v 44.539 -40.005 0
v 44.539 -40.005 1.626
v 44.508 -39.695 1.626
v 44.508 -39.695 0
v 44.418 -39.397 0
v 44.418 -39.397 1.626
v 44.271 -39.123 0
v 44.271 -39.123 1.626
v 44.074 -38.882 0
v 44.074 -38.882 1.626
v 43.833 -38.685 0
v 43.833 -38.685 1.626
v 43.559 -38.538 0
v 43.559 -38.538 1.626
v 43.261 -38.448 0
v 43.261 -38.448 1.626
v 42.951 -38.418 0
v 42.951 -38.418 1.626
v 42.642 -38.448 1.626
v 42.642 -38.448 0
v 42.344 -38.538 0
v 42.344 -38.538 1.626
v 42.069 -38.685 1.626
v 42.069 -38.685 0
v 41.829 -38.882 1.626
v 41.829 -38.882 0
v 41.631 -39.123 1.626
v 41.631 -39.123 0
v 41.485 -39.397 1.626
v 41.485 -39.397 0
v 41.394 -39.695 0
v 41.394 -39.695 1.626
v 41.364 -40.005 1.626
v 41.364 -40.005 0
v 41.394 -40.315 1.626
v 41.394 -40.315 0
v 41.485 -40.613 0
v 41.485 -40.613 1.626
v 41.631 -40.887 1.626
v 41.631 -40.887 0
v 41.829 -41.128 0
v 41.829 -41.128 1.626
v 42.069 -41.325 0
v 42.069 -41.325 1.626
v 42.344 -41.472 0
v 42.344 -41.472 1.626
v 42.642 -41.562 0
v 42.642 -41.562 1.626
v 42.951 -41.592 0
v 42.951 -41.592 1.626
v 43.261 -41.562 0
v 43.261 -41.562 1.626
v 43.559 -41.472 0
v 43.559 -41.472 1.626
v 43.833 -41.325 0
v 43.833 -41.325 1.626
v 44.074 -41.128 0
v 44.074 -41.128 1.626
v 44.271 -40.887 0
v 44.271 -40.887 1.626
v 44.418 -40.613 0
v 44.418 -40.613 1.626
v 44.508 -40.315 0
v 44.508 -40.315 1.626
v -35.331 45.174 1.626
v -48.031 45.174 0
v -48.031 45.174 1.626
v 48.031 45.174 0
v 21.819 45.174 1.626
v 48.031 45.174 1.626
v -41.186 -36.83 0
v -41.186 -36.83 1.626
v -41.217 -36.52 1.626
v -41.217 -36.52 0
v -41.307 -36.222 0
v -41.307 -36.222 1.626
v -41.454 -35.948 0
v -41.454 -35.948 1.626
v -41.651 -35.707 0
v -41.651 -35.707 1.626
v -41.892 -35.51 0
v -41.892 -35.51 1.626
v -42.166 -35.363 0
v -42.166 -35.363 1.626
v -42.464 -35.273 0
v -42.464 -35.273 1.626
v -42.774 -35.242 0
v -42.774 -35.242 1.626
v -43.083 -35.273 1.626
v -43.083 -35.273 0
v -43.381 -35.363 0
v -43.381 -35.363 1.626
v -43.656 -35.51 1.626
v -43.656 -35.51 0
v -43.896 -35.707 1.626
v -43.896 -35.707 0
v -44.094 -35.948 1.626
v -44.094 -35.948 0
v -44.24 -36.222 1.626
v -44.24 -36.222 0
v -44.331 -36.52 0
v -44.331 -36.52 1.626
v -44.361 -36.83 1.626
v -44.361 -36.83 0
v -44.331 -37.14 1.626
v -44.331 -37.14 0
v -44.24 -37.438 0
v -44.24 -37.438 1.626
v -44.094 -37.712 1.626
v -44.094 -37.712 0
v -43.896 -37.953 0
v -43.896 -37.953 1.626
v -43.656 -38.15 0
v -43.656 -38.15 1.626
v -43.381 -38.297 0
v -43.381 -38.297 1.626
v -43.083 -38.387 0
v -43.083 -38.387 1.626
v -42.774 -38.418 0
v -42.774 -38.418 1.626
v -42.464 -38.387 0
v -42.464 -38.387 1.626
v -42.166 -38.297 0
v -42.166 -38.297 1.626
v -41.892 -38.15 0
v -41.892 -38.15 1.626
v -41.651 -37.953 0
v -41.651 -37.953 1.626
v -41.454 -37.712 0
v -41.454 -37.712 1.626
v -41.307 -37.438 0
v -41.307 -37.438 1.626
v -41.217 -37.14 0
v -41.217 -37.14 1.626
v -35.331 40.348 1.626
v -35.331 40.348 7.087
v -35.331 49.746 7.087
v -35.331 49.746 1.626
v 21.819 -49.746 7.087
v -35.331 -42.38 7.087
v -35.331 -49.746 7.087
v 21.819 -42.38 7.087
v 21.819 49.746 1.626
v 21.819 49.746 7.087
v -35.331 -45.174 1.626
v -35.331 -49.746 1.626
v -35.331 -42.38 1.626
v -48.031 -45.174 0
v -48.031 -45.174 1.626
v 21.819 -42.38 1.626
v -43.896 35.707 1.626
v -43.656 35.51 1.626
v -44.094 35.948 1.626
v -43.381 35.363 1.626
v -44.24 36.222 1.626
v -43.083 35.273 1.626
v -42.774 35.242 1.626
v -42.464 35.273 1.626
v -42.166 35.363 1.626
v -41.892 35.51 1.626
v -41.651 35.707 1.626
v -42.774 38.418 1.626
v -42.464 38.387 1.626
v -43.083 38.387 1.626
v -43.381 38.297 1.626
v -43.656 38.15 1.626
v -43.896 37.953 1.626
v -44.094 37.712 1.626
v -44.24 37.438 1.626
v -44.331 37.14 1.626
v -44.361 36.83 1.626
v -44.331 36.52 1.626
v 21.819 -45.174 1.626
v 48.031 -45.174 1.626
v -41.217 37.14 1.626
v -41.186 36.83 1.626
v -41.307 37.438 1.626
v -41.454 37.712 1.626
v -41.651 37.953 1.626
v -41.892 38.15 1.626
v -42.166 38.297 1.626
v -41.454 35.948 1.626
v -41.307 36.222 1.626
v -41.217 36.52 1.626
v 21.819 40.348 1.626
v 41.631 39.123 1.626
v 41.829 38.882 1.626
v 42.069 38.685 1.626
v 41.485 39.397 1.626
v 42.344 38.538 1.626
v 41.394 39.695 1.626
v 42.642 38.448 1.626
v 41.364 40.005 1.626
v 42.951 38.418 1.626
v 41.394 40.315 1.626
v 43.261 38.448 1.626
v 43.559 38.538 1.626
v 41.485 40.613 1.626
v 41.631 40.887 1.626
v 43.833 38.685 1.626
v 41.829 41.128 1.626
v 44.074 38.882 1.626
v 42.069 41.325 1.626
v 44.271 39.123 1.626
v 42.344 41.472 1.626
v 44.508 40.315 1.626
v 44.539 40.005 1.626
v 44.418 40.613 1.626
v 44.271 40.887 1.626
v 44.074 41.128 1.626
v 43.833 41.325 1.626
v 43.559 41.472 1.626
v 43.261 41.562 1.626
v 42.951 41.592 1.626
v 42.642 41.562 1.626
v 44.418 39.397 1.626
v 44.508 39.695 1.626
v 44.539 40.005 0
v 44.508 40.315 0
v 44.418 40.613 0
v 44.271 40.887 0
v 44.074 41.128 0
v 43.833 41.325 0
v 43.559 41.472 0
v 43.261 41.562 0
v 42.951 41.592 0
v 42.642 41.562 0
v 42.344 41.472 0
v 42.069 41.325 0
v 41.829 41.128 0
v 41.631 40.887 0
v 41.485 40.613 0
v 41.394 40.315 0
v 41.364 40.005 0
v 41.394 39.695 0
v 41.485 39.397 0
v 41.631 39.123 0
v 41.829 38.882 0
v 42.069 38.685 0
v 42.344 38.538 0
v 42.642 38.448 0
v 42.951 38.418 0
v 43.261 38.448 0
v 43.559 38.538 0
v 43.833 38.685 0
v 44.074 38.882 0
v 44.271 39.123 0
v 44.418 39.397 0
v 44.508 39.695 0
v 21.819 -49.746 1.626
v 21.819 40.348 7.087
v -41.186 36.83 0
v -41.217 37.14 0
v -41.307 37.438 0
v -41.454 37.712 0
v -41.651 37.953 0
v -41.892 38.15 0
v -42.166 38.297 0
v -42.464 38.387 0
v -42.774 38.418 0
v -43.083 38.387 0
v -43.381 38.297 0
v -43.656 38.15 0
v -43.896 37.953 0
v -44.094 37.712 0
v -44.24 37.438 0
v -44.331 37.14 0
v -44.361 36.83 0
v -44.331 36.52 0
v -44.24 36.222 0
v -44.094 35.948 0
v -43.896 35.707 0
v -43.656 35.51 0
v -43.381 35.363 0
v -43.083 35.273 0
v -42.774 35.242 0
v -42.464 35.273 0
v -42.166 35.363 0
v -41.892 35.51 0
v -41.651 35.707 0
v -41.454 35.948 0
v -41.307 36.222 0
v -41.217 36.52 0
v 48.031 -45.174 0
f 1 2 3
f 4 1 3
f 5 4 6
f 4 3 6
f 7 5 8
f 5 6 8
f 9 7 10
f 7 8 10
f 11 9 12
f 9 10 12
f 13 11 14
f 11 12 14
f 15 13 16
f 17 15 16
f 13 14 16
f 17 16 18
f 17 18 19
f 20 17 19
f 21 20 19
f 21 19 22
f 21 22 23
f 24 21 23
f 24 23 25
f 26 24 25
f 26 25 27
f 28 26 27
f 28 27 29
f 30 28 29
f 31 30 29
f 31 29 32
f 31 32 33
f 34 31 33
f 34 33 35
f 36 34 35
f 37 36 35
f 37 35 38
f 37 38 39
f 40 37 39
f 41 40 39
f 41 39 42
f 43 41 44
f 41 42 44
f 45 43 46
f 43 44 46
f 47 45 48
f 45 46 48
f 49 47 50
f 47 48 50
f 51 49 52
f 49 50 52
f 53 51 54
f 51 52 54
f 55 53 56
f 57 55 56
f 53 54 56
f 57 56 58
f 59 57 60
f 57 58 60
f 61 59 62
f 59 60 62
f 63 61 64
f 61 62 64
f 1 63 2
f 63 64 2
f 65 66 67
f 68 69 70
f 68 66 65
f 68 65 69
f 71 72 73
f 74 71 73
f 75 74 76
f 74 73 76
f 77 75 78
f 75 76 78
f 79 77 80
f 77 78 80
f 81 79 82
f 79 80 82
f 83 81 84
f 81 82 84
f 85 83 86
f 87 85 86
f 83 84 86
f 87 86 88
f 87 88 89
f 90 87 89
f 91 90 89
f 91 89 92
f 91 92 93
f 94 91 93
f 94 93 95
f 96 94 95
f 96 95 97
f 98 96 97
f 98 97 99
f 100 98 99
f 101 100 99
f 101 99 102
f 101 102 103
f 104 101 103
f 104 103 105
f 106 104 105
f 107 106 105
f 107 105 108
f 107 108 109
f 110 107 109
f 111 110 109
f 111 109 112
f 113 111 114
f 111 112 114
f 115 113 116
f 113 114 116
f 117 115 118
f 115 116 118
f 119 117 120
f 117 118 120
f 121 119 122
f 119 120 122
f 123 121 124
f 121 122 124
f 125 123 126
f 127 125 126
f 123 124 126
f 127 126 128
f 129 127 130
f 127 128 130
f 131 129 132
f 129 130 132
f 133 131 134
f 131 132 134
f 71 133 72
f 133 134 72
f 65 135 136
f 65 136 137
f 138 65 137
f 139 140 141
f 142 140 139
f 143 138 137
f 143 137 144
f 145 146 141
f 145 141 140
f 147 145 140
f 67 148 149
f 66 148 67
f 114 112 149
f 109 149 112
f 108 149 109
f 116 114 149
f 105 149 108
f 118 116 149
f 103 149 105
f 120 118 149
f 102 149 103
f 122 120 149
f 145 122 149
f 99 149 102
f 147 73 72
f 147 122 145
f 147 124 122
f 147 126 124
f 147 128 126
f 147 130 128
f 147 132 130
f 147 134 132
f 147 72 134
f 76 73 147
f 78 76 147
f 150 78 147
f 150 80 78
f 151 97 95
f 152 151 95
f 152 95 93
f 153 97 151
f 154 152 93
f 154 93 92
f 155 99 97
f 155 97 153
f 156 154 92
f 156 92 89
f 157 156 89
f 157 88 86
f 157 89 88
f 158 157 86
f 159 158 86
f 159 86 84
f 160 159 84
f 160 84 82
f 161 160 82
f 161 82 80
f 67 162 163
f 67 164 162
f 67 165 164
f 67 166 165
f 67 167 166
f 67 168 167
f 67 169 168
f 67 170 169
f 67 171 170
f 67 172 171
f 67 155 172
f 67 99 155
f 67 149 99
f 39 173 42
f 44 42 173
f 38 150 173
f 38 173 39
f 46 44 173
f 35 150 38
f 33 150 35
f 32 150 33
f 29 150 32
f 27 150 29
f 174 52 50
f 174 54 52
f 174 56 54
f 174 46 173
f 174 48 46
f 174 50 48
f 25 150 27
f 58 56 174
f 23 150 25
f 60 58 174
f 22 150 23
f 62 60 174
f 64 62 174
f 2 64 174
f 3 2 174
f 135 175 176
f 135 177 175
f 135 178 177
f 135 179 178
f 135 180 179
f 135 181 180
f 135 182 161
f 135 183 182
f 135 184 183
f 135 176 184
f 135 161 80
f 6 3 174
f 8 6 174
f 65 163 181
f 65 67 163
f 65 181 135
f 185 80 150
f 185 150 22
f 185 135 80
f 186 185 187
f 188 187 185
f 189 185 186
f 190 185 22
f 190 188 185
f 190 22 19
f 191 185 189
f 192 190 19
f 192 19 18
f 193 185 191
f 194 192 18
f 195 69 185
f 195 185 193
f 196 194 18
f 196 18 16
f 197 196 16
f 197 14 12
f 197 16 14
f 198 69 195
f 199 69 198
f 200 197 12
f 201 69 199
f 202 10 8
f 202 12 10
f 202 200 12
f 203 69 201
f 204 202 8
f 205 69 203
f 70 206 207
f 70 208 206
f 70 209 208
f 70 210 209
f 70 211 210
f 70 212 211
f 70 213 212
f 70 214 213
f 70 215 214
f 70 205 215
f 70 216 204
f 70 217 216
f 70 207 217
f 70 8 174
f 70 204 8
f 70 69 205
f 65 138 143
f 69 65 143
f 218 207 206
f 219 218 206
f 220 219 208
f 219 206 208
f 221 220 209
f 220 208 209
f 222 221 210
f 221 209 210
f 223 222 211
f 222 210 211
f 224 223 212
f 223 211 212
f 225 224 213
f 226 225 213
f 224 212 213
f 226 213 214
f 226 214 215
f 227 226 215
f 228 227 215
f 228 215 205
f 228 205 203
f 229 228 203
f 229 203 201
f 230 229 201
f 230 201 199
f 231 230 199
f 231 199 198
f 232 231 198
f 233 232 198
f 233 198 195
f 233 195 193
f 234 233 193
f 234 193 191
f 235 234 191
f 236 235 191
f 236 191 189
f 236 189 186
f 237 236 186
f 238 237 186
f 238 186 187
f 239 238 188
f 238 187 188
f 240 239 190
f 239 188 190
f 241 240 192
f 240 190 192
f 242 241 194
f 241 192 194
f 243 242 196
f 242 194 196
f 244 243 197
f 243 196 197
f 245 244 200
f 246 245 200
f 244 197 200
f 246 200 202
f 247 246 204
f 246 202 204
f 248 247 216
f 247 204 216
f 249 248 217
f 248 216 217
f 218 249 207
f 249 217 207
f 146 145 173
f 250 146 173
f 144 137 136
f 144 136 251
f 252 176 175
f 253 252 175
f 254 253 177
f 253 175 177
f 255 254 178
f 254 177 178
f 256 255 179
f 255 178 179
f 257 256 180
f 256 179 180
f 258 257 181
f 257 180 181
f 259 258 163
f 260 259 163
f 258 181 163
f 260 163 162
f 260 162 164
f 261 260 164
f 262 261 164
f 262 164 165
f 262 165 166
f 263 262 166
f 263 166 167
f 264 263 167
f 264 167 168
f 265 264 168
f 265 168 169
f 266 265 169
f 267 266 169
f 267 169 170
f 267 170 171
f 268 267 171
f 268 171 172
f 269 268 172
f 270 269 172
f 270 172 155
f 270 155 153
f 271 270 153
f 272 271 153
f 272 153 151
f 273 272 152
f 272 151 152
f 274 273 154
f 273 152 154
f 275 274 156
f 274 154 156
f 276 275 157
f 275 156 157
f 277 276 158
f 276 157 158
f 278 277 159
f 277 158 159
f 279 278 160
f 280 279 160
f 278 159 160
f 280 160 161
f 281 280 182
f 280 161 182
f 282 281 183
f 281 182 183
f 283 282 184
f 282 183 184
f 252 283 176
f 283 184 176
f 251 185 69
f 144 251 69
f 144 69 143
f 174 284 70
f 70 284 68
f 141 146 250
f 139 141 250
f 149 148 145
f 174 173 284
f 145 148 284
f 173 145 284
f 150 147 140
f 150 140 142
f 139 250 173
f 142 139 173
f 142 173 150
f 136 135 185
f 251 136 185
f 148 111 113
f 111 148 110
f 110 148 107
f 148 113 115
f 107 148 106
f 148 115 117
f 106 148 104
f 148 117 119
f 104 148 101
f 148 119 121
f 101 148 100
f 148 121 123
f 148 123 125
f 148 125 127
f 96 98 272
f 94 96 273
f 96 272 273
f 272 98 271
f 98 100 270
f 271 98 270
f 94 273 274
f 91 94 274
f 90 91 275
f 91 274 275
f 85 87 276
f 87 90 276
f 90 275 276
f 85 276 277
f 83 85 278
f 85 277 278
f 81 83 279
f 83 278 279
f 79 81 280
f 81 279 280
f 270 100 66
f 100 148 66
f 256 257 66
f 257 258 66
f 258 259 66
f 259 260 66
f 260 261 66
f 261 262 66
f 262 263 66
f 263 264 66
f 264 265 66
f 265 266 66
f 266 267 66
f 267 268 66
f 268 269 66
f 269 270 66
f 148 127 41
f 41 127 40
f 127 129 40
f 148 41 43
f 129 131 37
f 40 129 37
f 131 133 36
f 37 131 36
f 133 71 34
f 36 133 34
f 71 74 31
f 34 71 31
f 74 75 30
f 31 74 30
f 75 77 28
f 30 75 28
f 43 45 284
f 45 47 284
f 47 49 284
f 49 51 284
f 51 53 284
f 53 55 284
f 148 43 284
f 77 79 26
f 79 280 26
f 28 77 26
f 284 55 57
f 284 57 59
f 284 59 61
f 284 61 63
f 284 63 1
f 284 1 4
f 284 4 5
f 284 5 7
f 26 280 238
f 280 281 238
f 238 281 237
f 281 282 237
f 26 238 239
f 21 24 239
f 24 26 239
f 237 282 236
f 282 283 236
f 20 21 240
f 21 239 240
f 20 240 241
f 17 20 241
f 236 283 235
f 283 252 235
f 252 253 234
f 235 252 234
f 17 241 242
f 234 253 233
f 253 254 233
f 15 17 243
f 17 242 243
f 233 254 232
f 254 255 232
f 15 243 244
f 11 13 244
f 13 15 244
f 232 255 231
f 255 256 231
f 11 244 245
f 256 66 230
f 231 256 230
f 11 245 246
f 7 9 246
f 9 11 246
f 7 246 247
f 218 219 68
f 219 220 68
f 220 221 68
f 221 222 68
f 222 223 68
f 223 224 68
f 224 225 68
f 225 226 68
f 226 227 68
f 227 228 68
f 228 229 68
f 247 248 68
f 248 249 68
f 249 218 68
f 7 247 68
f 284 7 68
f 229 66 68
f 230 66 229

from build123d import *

# Parameters (mm, degrees)
SKETCH1_W            = 96.0628
SKETCH1_H            = 90.3478
PCB_DEPTH            = 1.6256
SKETCH5_R            = 1.5875
PCB_HOLES_DEPTH      = 66.957101229
SKETCH6_W            = 57.15
SKETCH6_H            = 7.366
SKETCH6_H_2          = 9.398
PCB_EDGE_CONNS_DEPTH = 5.461


with BuildPart() as part:
    # Sketch1 → PCB (new body)
    with BuildSketch(Plane.XY):
        Rectangle(SKETCH1_W, SKETCH1_H)
    extrude(amount=PCB_DEPTH)

    # Sketch5 → PCB_Holes (cut, through all)
    with BuildSketch(Plane.XY.offset(1.6256)):
        with Locations((-42.7736, 36.83)):
            Circle(SKETCH5_R)
        with Locations((42.9514, 40.005)):
            Circle(SKETCH5_R)
        with Locations((42.9514, -40.005)):
            Circle(SKETCH5_R)
        with Locations((-42.7736, -36.83)):
            Circle(SKETCH5_R)
    extrude(amount=-PCB_HOLES_DEPTH, mode=Mode.SUBTRACT)

    # Sketch6 → PCB_Edge_Conns (add)
    with BuildSketch(Plane.XY.offset(1.6256)):
        with Locations((-6.7564, -46.0629)):
            Rectangle(SKETCH6_W, SKETCH6_H)
        with Locations((-6.7564, 45.0469)):
            Rectangle(SKETCH6_W, SKETCH6_H_2)
    extrude(amount=PCB_EDGE_CONNS_DEPTH)


solid = part.part
